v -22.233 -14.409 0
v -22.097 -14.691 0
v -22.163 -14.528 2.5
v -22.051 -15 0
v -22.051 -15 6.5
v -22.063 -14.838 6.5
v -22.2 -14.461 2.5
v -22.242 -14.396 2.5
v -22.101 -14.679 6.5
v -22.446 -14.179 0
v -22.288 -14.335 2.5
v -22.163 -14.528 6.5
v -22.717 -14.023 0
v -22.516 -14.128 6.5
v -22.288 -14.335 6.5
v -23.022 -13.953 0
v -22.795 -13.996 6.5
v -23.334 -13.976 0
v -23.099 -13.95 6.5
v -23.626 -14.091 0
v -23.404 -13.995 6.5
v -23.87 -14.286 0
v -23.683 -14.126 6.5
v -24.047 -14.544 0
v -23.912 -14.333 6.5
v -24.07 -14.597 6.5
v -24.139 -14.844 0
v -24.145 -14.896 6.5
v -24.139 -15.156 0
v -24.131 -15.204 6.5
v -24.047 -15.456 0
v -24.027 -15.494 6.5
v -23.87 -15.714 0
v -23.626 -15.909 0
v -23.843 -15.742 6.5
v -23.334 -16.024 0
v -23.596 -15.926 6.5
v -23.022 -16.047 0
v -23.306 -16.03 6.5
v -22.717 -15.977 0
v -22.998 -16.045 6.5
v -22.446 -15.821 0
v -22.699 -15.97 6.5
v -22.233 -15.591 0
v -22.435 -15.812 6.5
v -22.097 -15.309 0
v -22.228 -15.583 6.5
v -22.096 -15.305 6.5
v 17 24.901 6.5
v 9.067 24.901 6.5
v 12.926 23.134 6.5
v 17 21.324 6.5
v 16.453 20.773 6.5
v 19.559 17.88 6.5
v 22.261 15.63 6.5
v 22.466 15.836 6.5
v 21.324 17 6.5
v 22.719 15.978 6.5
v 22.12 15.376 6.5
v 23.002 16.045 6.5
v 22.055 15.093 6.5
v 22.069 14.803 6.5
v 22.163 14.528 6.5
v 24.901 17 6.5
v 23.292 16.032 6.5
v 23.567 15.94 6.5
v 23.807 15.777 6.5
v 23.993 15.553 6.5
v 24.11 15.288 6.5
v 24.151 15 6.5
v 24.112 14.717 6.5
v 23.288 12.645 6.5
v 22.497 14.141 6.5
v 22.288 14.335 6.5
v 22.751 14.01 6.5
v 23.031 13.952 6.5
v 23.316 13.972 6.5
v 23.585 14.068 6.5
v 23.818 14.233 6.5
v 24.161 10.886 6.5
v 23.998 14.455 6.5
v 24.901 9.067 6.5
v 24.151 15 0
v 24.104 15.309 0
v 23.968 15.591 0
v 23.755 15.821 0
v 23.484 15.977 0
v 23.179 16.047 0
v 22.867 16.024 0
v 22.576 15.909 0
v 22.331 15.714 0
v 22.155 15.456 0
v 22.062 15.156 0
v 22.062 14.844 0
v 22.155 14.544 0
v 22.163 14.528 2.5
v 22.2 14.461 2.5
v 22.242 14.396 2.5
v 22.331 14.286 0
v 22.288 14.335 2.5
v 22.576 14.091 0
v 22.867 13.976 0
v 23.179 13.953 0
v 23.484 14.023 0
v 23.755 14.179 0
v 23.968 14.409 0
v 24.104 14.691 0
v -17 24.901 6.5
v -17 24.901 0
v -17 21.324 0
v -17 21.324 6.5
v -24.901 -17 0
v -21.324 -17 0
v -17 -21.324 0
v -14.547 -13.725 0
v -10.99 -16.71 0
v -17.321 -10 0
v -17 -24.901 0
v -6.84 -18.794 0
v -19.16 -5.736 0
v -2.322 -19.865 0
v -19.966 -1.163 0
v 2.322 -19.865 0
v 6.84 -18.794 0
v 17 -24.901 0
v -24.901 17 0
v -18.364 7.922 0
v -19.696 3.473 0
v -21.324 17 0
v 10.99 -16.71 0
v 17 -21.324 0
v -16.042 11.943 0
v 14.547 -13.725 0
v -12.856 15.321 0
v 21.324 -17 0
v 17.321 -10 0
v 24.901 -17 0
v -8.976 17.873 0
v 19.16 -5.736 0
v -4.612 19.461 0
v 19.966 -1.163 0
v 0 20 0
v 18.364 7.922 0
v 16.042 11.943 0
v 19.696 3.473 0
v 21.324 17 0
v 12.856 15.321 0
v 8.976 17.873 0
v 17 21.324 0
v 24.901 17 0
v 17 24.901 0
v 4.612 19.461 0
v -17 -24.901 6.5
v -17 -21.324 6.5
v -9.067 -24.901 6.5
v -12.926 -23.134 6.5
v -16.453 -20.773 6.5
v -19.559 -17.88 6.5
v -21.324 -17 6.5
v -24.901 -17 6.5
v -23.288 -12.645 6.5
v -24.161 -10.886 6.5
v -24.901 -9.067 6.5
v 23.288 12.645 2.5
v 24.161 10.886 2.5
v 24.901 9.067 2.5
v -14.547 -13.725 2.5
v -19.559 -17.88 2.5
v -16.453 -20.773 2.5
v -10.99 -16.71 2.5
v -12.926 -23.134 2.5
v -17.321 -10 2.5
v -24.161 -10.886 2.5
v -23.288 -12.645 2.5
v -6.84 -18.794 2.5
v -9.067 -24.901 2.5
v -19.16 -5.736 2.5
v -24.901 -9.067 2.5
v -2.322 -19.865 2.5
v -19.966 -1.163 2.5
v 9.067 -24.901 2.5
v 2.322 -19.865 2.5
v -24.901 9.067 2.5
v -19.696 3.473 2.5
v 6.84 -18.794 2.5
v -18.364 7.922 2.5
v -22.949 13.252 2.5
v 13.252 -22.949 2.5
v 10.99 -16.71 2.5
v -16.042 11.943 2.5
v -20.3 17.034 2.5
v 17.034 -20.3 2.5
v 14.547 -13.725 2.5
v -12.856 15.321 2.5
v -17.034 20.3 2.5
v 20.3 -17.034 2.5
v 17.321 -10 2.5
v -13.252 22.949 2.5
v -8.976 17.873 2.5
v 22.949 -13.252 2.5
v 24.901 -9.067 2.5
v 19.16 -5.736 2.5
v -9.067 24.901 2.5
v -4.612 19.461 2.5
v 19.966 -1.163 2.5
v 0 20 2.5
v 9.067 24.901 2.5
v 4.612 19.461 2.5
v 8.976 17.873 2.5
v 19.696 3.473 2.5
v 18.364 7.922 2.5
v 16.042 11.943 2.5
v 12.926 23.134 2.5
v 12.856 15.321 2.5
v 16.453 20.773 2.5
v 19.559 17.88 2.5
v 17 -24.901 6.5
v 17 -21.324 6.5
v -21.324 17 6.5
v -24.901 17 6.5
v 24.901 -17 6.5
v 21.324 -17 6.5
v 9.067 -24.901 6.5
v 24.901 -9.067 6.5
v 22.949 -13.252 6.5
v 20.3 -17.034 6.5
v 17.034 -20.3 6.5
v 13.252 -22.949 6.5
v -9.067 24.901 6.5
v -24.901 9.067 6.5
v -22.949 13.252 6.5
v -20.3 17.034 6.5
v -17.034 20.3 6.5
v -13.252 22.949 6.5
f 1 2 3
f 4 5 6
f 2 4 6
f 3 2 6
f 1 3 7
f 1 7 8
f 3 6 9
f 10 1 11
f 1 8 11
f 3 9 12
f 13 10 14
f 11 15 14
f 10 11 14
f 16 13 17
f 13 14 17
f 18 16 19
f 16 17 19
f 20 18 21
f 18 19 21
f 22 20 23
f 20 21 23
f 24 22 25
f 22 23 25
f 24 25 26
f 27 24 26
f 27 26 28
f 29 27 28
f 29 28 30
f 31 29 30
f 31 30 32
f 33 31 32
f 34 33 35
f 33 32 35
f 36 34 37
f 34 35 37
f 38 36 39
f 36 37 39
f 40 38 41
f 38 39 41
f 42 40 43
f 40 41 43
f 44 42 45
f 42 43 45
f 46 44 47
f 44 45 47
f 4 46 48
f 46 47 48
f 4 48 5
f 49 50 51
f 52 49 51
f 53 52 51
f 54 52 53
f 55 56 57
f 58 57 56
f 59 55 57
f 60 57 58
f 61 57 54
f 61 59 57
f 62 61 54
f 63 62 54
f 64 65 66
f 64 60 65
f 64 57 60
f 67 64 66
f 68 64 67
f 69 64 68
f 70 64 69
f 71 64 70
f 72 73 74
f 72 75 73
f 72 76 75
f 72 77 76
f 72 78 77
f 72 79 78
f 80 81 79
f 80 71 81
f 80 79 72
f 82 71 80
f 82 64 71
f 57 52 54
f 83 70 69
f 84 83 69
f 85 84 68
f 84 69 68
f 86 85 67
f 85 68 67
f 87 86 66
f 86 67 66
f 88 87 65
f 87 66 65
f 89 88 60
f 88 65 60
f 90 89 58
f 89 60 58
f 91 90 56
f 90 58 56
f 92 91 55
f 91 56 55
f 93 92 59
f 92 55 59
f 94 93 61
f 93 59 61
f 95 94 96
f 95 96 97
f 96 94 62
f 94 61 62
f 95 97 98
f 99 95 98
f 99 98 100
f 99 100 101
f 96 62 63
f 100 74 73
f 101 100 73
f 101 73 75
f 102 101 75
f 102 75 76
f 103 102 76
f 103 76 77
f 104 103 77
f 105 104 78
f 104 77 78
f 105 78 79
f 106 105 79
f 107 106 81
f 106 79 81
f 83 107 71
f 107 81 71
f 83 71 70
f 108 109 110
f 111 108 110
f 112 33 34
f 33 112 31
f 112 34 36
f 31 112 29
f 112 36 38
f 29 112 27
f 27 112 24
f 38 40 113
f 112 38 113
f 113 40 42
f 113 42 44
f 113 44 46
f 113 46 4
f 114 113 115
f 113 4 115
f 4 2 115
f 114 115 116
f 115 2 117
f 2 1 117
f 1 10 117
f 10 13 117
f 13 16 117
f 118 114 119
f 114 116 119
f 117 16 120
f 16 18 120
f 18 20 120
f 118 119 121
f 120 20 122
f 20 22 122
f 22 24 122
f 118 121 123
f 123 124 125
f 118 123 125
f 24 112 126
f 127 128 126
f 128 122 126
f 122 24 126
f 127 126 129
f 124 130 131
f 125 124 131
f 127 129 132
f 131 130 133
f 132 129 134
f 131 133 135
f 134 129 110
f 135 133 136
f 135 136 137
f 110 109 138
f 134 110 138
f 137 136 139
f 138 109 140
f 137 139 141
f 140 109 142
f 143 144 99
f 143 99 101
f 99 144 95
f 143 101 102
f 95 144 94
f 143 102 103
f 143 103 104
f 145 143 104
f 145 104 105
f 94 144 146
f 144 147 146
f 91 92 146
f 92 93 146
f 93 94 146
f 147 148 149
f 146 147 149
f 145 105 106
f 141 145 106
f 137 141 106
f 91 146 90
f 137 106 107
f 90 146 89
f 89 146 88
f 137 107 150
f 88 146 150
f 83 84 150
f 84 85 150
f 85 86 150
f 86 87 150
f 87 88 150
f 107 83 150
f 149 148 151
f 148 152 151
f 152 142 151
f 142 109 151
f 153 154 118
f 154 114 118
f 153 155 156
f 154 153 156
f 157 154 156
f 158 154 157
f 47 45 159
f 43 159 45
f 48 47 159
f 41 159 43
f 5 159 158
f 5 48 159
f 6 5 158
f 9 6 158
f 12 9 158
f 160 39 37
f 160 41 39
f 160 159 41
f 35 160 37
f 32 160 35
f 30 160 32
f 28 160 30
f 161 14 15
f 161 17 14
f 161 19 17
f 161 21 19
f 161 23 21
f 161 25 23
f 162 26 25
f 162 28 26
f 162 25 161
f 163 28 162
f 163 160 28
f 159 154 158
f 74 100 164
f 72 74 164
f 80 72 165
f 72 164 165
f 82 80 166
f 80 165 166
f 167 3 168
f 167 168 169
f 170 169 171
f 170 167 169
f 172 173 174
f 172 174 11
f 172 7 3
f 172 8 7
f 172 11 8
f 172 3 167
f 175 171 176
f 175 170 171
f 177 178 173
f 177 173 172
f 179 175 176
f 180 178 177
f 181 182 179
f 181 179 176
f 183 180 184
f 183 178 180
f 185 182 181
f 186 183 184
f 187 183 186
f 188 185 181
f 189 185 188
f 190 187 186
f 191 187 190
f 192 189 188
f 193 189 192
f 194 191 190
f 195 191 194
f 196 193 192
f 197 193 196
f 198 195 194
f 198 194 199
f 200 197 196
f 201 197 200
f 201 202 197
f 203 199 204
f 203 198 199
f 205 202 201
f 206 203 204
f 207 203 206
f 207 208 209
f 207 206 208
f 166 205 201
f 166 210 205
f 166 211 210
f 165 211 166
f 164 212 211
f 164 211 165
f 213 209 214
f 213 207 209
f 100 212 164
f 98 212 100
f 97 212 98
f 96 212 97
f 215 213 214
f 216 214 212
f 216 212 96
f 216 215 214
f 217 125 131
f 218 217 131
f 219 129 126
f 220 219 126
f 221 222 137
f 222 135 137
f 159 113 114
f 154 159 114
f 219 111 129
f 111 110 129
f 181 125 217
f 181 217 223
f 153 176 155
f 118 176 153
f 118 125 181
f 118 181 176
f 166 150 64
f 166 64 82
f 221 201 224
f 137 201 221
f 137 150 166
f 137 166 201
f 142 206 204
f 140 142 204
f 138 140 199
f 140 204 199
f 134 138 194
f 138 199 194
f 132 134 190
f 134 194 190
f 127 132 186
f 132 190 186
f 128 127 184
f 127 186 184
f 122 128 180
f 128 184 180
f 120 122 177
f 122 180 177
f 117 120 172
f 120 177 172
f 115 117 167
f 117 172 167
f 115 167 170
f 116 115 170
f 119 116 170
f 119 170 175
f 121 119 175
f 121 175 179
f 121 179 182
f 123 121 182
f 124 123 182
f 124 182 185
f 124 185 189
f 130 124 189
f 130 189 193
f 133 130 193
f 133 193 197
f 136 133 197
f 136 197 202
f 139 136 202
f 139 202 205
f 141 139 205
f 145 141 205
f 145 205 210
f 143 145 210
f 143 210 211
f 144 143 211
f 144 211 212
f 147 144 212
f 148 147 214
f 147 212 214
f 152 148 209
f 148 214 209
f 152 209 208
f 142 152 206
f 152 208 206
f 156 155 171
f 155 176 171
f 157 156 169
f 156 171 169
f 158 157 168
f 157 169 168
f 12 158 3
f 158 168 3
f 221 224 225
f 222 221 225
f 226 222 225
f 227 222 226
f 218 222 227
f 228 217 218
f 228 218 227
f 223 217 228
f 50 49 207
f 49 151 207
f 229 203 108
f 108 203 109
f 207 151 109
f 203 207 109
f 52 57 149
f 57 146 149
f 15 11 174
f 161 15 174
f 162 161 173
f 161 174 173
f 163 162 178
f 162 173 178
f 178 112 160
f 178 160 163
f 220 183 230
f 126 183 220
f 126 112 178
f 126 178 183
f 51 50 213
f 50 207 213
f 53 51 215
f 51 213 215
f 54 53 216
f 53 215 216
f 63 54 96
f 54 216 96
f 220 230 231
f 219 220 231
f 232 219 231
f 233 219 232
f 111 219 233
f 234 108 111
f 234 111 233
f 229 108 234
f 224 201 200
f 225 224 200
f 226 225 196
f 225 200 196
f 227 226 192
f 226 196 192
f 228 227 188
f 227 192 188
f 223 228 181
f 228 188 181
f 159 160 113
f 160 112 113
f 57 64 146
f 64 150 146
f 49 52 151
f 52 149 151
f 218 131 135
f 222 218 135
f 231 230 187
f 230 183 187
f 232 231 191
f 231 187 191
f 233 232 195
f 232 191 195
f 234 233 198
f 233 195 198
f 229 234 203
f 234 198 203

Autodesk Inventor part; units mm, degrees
ref_plane "YZ Plane" through (0, 0, 0) normal (1, 0, 0) x (0, 1, 0)
ref_plane "XZ Plane" through (0, 0, 0) normal (0, 1, 0) x (-1, 0, 0)
ref_plane "XY Plane" through (0, 0, 0) normal (0, 0, 1) x (1, 0, 0)
sketch "Sketch1" plane through (0, 0, 0) normal (0, 0, 1) x (1, 0, 0)
  line L0 (-34.8609, 0) -> (34.8609, 0) construction
  line L1 (0, -34.8609) -> (0, 34.8609) construction
  line L2 (0, 0) -> (11.6542, 11.6542) construction
  line L3 (0, 0) -> (16.4815, 0) construction
  line L4 (0, 24.9006) -> (16.8, 24.9006)
  line L5 (16.8, 24.9006) -> (16.8, 21.2406)
  line L6 (16.8, 21.2406) -> (19.0203, 19.0203)
  line L7 (24.9006, 0) -> (24.9006, 16.8)
  line L8 (24.9006, 16.8) -> (21.2406, 16.8)
  line L9 (21.2406, 16.8) -> (19.0203, 19.0203)
  line L10 (0, 0) -> (-11.6542, 11.6542) construction
  line L11 (0, 0) -> (-16.4815, 0) construction
  line L12 (0, 24.9006) -> (-16.8, 24.9006)
  line L13 (-16.8, 24.9006) -> (-16.8, 21.2406)
  line L14 (-16.8, 21.2406) -> (-19.0203, 19.0203)
  line L15 (-24.9006, 0) -> (-24.9006, 16.8)
  line L16 (-24.9006, 16.8) -> (-21.2406, 16.8)
  line L17 (-21.2406, 16.8) -> (-19.0203, 19.0203)
  line L18 (0, 0) -> (11.6542, -11.6542) construction
  line L19 (0, -24.9006) -> (16.8, -24.9006)
  line L20 (16.8, -24.9006) -> (16.8, -21.2406)
  line L21 (16.8, -21.2406) -> (19.0203, -19.0203)
  line L22 (24.9006, 0) -> (24.9006, -16.8)
  line L23 (24.9006, -16.8) -> (21.2406, -16.8)
  line L24 (21.2406, -16.8) -> (19.0203, -19.0203)
  line L25 (0, 0) -> (-11.6542, -11.6542) construction
  line L26 (0, -24.9006) -> (-16.8, -24.9006)
  line L27 (-16.8, -24.9006) -> (-16.8, -21.2406)
  line L28 (-16.8, -21.2406) -> (-19.0203, -19.0203)
  line L29 (-24.9006, 0) -> (-24.9006, -16.8)
  line L30 (-24.9006, -16.8) -> (-21.2406, -16.8)
  line L31 (-21.2406, -16.8) -> (-19.0203, -19.0203)
  dimension "d0" = 45
  dimension "d1" = 3.14
  dimension "d2" = 3.66
  dimension "d3" = 16.8
extrude "Extrusion1" add sketch "Sketch1" along normal blind 2.5
hole "Hole1" at (0, 0, 0) direction (0, 0, 1) diameter 40 end through all
sketch "Sketch5" plane through (0, 0, 2.5) normal (0, 0, 1) x (1, 0, 0)
  circle A0 centre (-22.1796, -5.0624) radius 1.25 construction
  circle A1 centre (-17.7867, 14.1844) radius 1.25 construction
  circle A2 centre (0, 22.75) radius 1.25 construction
  arc A3 (5.9445, 23.5204) -> (2.0147, 24.1761) centre (3.9503, 23.6727) ccw construction
  line L0 (2.0147, 24.1761) -> (2, 24) construction
  arc A4 (2, 24) -> (1.9973, 24.1039) centre (0, 24) ccw construction
  arc A5 (1.9973, 24.1039) -> (1.9775, 24.0019) centre (3.9503, 23.6727) ccw construction
  line L1 (1.9775, 24.0019) -> (1.9921, 24.178) construction
  arc A6 (1.9921, 24.178) -> (-1.9921, 24.178) centre (0, 24) ccw construction
  line L2 (-1.9921, 24.178) -> (-1.9775, 24.0019) construction
  arc A7 (-1.9775, 24.0019) -> (-1.9973, 24.1039) centre (-3.9503, 23.6727) ccw construction
  arc A8 (-1.9973, 24.1039) -> (-2, 24) centre (0, 24) ccw construction
  line L3 (-2, 24) -> (-2.0147, 24.1761) construction
  arc A9 (-2.0147, 24.1761) -> (-5.9445, 23.5204) centre (-3.9503, 23.6727) ccw construction
  line L4 (-5.9445, 23.5204) -> (-5.9012, 23.349) construction
  arc A10 (-5.9012, 23.349) -> (-5.9374, 23.4464) centre (-7.7928, 22.6996) ccw construction
  arc A11 (-5.9374, 23.4464) -> (-5.923, 23.3435) centre (-3.9503, 23.6727) ccw construction
  line L5 (-5.923, 23.3435) -> (-5.9665, 23.5148) construction
  arc A12 (-5.9665, 23.5148) -> (-9.7347, 22.2212) centre (-7.7928, 22.6996) ccw construction
  line L6 (-9.7347, 22.2212) -> (-9.6638, 22.0593) construction
  arc A13 (-9.6638, 22.0593) -> (-9.7156, 22.1493) centre (-11.4227, 21.1074) ccw construction
  arc A14 (-9.7156, 22.1493) -> (-9.6844, 22.0502) centre (-7.7928, 22.6996) ccw construction
  line L7 (-9.6844, 22.0502) -> (-9.7555, 22.212) construction
  arc A15 (-9.7555, 22.212) -> (-13.2594, 20.3158) centre (-11.4227, 21.1074) ccw construction
  line L8 (-13.2594, 20.3158) -> (-13.1628, 20.1678) construction
  arc A16 (-13.1628, 20.1678) -> (-13.2287, 20.2481) centre (-14.7411, 18.9394) ccw construction
  arc A17 (-13.2287, 20.2481) -> (-13.1817, 20.1555) centre (-11.4227, 21.1074) ccw construction
  line L9 (-13.1817, 20.1555) -> (-13.2784, 20.3034) construction
  arc A18 (-13.2784, 20.3034) -> (-16.4225, 17.8563) centre (-14.7411, 18.9394) ccw construction
  line L10 (-16.4225, 17.8563) -> (-16.3028, 17.7262) construction
  arc A19 (-16.3028, 17.7262) -> (-16.381, 17.7946) centre (-17.6574, 16.2548) ccw construction
  arc A20 (-16.381, 17.7946) -> (-16.3194, 17.7109) centre (-14.7411, 18.9394) ccw construction
  line L11 (-16.3194, 17.7109) -> (-16.4392, 17.8409) construction
  arc A21 (-16.4392, 17.8409) -> (-19.1375, 14.9097) centre (-17.6574, 16.2548) ccw construction
  line L12 (-19.1375, 14.9097) -> (-18.9981, 14.8011) construction
  arc A22 (-18.9981, 14.8011) -> (-19.0865, 14.8556) centre (-20.092, 13.1268) ccw construction
  arc A23 (-19.0865, 14.8556) -> (-19.0119, 14.7833) centre (-17.6574, 16.2548) ccw construction
  line L13 (-19.0119, 14.7833) -> (-19.1515, 14.8918) construction
  arc A24 (-19.1515, 14.8918) -> (-21.3306, 11.5564) centre (-20.092, 13.1268) ccw construction
  line L14 (-21.3306, 11.5564) -> (-21.1752, 11.4722) construction
  arc A25 (-21.1752, 11.4722) -> (-21.2714, 11.5115) centre (-21.9786, 9.6407) ccw construction
  arc A26 (-21.2714, 11.5115) -> (-21.1859, 11.4524) centre (-20.092, 13.1268) ccw construction
  line L15 (-21.1859, 11.4524) -> (-21.3414, 11.5365) construction
  arc A27 (-21.3414, 11.5365) -> (-22.9418, 7.8879) centre (-21.9786, 9.6407) ccw construction
  line L16 (-22.9418, 7.8879) -> (-22.7746, 7.8305) construction
  arc A28 (-22.7746, 7.8305) -> (-22.876, 7.8533) centre (-23.2656, 5.8917) ccw construction
  arc A29 (-22.876, 7.8533) -> (-22.782, 7.8091) centre (-21.9786, 9.6407) ccw construction
  line L17 (-22.782, 7.8091) -> (-22.9492, 7.8665) construction
  arc A30 (-22.9492, 7.8665) -> (-23.9272, 4.0042) centre (-23.2656, 5.8917) ccw construction
  line L18 (-23.9272, 4.0042) -> (-23.7529, 3.9751) construction
  arc A31 (-23.7529, 3.9751) -> (-23.8566, 3.981) centre (-23.918, 1.9819) ccw construction
  arc A32 (-23.8566, 3.981) -> (-23.7566, 3.9529) centre (-23.2656, 5.8917) ccw construction
  line L19 (-23.7566, 3.9529) -> (-23.9309, 3.9819) construction
  arc A33 (-23.9309, 3.9819) -> (-24.2599, 0.0113) centre (-23.918, 1.9819) ccw construction
  line L20 (-24.2599, 0.0113) -> (-24.0832, 0.0113) construction
  arc A34 (-24.0832, 0.0113) -> (-24.1865, 0) centre (-23.918, -1.9819) ccw construction
  arc A35 (-24.1865, 0) -> (-24.0832, -0.0113) centre (-23.918, 1.9819) ccw construction
  line L21 (-24.0832, -0.0113) -> (-24.2599, -0.0113) construction
  arc A36 (-24.2599, -0.0113) -> (-23.9309, -3.9819) centre (-23.918, -1.9819) ccw construction
  line L22 (-23.9309, -3.9819) -> (-23.7566, -3.9529) construction
  arc A37 (-23.7566, -3.9529) -> (-23.8566, -3.981) centre (-23.2656, -5.8917) ccw construction
  arc A38 (-23.8566, -3.981) -> (-23.7529, -3.9751) centre (-23.918, -1.9819) ccw construction
  line L23 (-23.7529, -3.9751) -> (-23.9272, -4.0042) construction
  arc A39 (-23.9272, -4.0042) -> (-22.9492, -7.8665) centre (-23.2656, -5.8917) ccw construction
  line L24 (-22.9492, -7.8665) -> (-22.782, -7.8091) construction
  arc A40 (-22.782, -7.8091) -> (-22.876, -7.8533) centre (-21.9786, -9.6407) ccw construction
  arc A41 (-22.876, -7.8533) -> (-22.7746, -7.8305) centre (-23.2656, -5.8917) ccw construction
  line L25 (-22.7746, -7.8305) -> (-22.9418, -7.8879) construction
  arc A42 (-22.9418, -7.8879) -> (-21.3414, -11.5365) centre (-21.9786, -9.6407) ccw construction
  line L26 (-21.3414, -11.5365) -> (-21.1859, -11.4524) construction
  arc A43 (-21.1859, -11.4524) -> (-21.2714, -11.5115) centre (-20.092, -13.1268) ccw construction
  arc A44 (-21.2714, -11.5115) -> (-21.1752, -11.4722) centre (-21.9786, -9.6407) ccw construction
  line L27 (-21.1752, -11.4722) -> (-21.3306, -11.5564) construction
  arc A45 (-21.3306, -11.5564) -> (-19.1515, -14.8918) centre (-20.092, -13.1268) ccw construction
  line L28 (-19.1515, -14.8918) -> (-19.0119, -14.7833) construction
  arc A46 (-19.0119, -14.7833) -> (-19.0865, -14.8556) centre (-17.6574, -16.2548) ccw construction
  arc A47 (-19.0865, -14.8556) -> (-18.9981, -14.8011) centre (-20.092, -13.1268) ccw construction
  line L29 (-18.9981, -14.8011) -> (-19.1375, -14.9097) construction
  arc A48 (-19.1375, -14.9097) -> (-16.4392, -17.8409) centre (-17.6574, -16.2548) ccw construction
  line L30 (-16.4392, -17.8409) -> (-16.3194, -17.7109) construction
  arc A49 (-16.3194, -17.7109) -> (-16.381, -17.7946) centre (-14.7411, -18.9394) ccw construction
  arc A50 (-16.381, -17.7946) -> (-16.3028, -17.7262) centre (-17.6574, -16.2548) ccw construction
  line L31 (-16.3028, -17.7262) -> (-16.4225, -17.8563) construction
  arc A51 (-16.4225, -17.8563) -> (-13.2784, -20.3034) centre (-14.7411, -18.9394) ccw construction
  line L32 (-13.2784, -20.3034) -> (-13.1817, -20.1555) construction
  arc A52 (-13.1817, -20.1555) -> (-13.2287, -20.2481) centre (-11.4227, -21.1074) ccw construction
  arc A53 (-13.2287, -20.2481) -> (-13.1628, -20.1678) centre (-14.7411, -18.9394) ccw construction
  line L33 (-13.1628, -20.1678) -> (-13.2594, -20.3158) construction
  arc A54 (-13.2594, -20.3158) -> (-9.7555, -22.212) centre (-11.4227, -21.1074) ccw construction
  line L34 (-9.7555, -22.212) -> (-9.6844, -22.0502) construction
  arc A55 (-9.6844, -22.0502) -> (-9.7156, -22.1493) centre (-7.7928, -22.6996) ccw construction
  arc A56 (-9.7156, -22.1493) -> (-9.6638, -22.0593) centre (-11.4227, -21.1074) ccw construction
  line L35 (-9.6638, -22.0593) -> (-9.7347, -22.2212) construction
  arc A57 (-9.7347, -22.2212) -> (-5.9665, -23.5148) centre (-7.7928, -22.6996) ccw construction
  line L36 (-5.9665, -23.5148) -> (-5.923, -23.3435) construction
  arc A58 (-5.923, -23.3435) -> (-5.9374, -23.4464) centre (-3.9503, -23.6727) ccw construction
  arc A59 (-5.9374, -23.4464) -> (-5.9012, -23.349) centre (-7.7928, -22.6996) ccw construction
  line L37 (-5.9012, -23.349) -> (-5.9445, -23.5204) construction
  arc A60 (-5.9445, -23.5204) -> (-2.0147, -24.1761) centre (-3.9503, -23.6727) ccw construction
  line L38 (-2.0147, -24.1761) -> (-2, -24) construction
  arc A61 (-2, -24) -> (-1.9973, -24.1039) centre (0, -24) ccw construction
  arc A62 (-1.9973, -24.1039) -> (-1.9775, -24.0019) centre (-3.9503, -23.6727) ccw construction
  line L39 (-1.9775, -24.0019) -> (-1.9921, -24.178) construction
  arc A63 (-1.9921, -24.178) -> (1.9921, -24.178) centre (0, -24) ccw construction
  line L40 (1.9921, -24.178) -> (1.9775, -24.0019) construction
  arc A64 (1.9775, -24.0019) -> (1.9973, -24.1039) centre (3.9503, -23.6727) ccw construction
  arc A65 (1.9973, -24.1039) -> (2, -24) centre (0, -24) ccw construction
  line L41 (2, -24) -> (2.0147, -24.1761) construction
  arc A66 (2.0147, -24.1761) -> (5.9445, -23.5204) centre (3.9503, -23.6727) ccw construction
  line L42 (5.9445, -23.5204) -> (5.9012, -23.349) construction
  arc A67 (5.9012, -23.349) -> (5.9374, -23.4464) centre (7.7928, -22.6996) ccw construction
  arc A68 (5.9374, -23.4464) -> (5.923, -23.3435) centre (3.9503, -23.6727) ccw construction
  line L43 (5.923, -23.3435) -> (5.9665, -23.5148) construction
  arc A69 (5.9665, -23.5148) -> (9.7347, -22.2212) centre (7.7928, -22.6996) ccw construction
  line L44 (9.7347, -22.2212) -> (9.6638, -22.0593) construction
  arc A70 (9.6638, -22.0593) -> (9.7156, -22.1493) centre (11.4227, -21.1074) ccw construction
  arc A71 (9.7156, -22.1493) -> (9.6844, -22.0502) centre (7.7928, -22.6996) ccw construction
  line L45 (9.6844, -22.0502) -> (9.7555, -22.212) construction
  arc A72 (9.7555, -22.212) -> (13.2594, -20.3158) centre (11.4227, -21.1074) ccw construction
  line L46 (13.2594, -20.3158) -> (13.1628, -20.1678) construction
  arc A73 (13.1628, -20.1678) -> (13.2287, -20.2481) centre (14.7411, -18.9394) ccw construction
  arc A74 (13.2287, -20.2481) -> (13.1817, -20.1555) centre (11.4227, -21.1074) ccw construction
  line L47 (13.1817, -20.1555) -> (13.2784, -20.3034) construction
  arc A75 (13.2784, -20.3034) -> (16.4225, -17.8563) centre (14.7411, -18.9394) ccw construction
  line L48 (16.4225, -17.8563) -> (16.3028, -17.7262) construction
  arc A76 (16.3028, -17.7262) -> (16.381, -17.7946) centre (17.6574, -16.2548) ccw construction
  arc A77 (16.381, -17.7946) -> (16.3194, -17.7109) centre (14.7411, -18.9394) ccw construction
  line L49 (16.3194, -17.7109) -> (16.4392, -17.8409) construction
  arc A78 (16.4392, -17.8409) -> (19.1375, -14.9097) centre (17.6574, -16.2548) ccw construction
  line L50 (19.1375, -14.9097) -> (18.9981, -14.8011) construction
  arc A79 (18.9981, -14.8011) -> (19.0865, -14.8556) centre (20.092, -13.1268) ccw construction
  arc A80 (19.0865, -14.8556) -> (19.0119, -14.7833) centre (17.6574, -16.2548) ccw construction
  line L51 (19.0119, -14.7833) -> (19.1515, -14.8918) construction
  arc A81 (19.1515, -14.8918) -> (21.3306, -11.5564) centre (20.092, -13.1268) ccw construction
  line L52 (21.3306, -11.5564) -> (21.1752, -11.4722) construction
  arc A82 (21.1752, -11.4722) -> (21.2714, -11.5115) centre (21.9786, -9.6407) ccw construction
  arc A83 (21.2714, -11.5115) -> (21.1859, -11.4524) centre (20.092, -13.1268) ccw construction
  line L53 (21.1859, -11.4524) -> (21.3414, -11.5365) construction
  arc A84 (21.3414, -11.5365) -> (22.9418, -7.8879) centre (21.9786, -9.6407) ccw construction
  line L54 (22.9418, -7.8879) -> (22.7746, -7.8305) construction
  arc A85 (22.7746, -7.8305) -> (22.876, -7.8533) centre (23.2656, -5.8917) ccw construction
  arc A86 (22.876, -7.8533) -> (22.782, -7.8091) centre (21.9786, -9.6407) ccw construction
  line L55 (22.782, -7.8091) -> (22.9492, -7.8665) construction
  arc A87 (22.9492, -7.8665) -> (23.9272, -4.0042) centre (23.2656, -5.8917) ccw construction
  line L56 (23.9272, -4.0042) -> (23.7529, -3.9751) construction
  arc A88 (23.7529, -3.9751) -> (23.8566, -3.981) centre (23.918, -1.9819) ccw construction
  arc A89 (23.8566, -3.981) -> (23.7566, -3.9529) centre (23.2656, -5.8917) ccw construction
  line L57 (23.7566, -3.9529) -> (23.9309, -3.9819) construction
  arc A90 (23.9309, -3.9819) -> (24.2599, -0.0113) centre (23.918, -1.9819) ccw construction
  line L58 (24.2599, -0.0113) -> (24.0832, -0.0113) construction
  arc A91 (24.0832, -0.0113) -> (24.1865, 0) centre (23.918, 1.9819) ccw construction
  arc A92 (24.1865, 0) -> (24.0832, 0.0113) centre (23.918, -1.9819) ccw construction
  line L59 (24.0832, 0.0113) -> (24.2599, 0.0113) construction
  arc A93 (24.2599, 0.0113) -> (23.9309, 3.9819) centre (23.918, 1.9819) ccw construction
  line L60 (23.9309, 3.9819) -> (23.7566, 3.9529) construction
  arc A94 (23.7566, 3.9529) -> (23.8566, 3.981) centre (23.2656, 5.8917) ccw construction
  arc A95 (23.8566, 3.981) -> (23.7529, 3.9751) centre (23.918, 1.9819) ccw construction
  line L61 (23.7529, 3.9751) -> (23.9272, 4.0042) construction
  arc A96 (23.9272, 4.0042) -> (22.9492, 7.8665) centre (23.2656, 5.8917) ccw construction
  line L62 (22.9492, 7.8665) -> (22.782, 7.8091) construction
  arc A97 (22.782, 7.8091) -> (22.876, 7.8533) centre (21.9786, 9.6407) ccw construction
  arc A98 (22.876, 7.8533) -> (22.7746, 7.8305) centre (23.2656, 5.8917) ccw construction
  line L63 (22.7746, 7.8305) -> (22.9418, 7.8879) construction
  arc A99 (22.9418, 7.8879) -> (21.3414, 11.5365) centre (21.9786, 9.6407) ccw construction
  line L64 (21.3414, 11.5365) -> (21.1859, 11.4524) construction
  arc A100 (21.1859, 11.4524) -> (21.2714, 11.5115) centre (20.092, 13.1268) ccw construction
  arc A101 (21.2714, 11.5115) -> (21.1752, 11.4722) centre (21.9786, 9.6407) ccw construction
  line L65 (21.1752, 11.4722) -> (21.3306, 11.5564) construction
  arc A102 (21.3306, 11.5564) -> (19.1515, 14.8918) centre (20.092, 13.1268) ccw construction
  line L66 (19.1515, 14.8918) -> (19.0119, 14.7833) construction
  arc A103 (19.0119, 14.7833) -> (19.0865, 14.8556) centre (17.6574, 16.2548) ccw construction
  arc A104 (19.0865, 14.8556) -> (18.9981, 14.8011) centre (20.092, 13.1268) ccw construction
  line L67 (18.9981, 14.8011) -> (19.1375, 14.9097) construction
  arc A105 (19.1375, 14.9097) -> (16.4392, 17.8409) centre (17.6574, 16.2548) ccw construction
  line L68 (16.4392, 17.8409) -> (16.3194, 17.7109) construction
  arc A106 (16.3194, 17.7109) -> (16.381, 17.7946) centre (14.7411, 18.9394) ccw construction
  arc A107 (16.381, 17.7946) -> (16.3028, 17.7262) centre (17.6574, 16.2548) ccw construction
  line L69 (16.3028, 17.7262) -> (16.4225, 17.8563) construction
  arc A108 (16.4225, 17.8563) -> (13.2784, 20.3034) centre (14.7411, 18.9394) ccw construction
  line L70 (13.2784, 20.3034) -> (13.1817, 20.1555) construction
  arc A109 (13.1817, 20.1555) -> (13.2287, 20.2481) centre (11.4227, 21.1074) ccw construction
  arc A110 (13.2287, 20.2481) -> (13.1628, 20.1678) centre (14.7411, 18.9394) ccw construction
  line L71 (13.1628, 20.1678) -> (13.2594, 20.3158) construction
  arc A111 (13.2594, 20.3158) -> (9.7555, 22.212) centre (11.4227, 21.1074) ccw construction
  line L72 (9.7555, 22.212) -> (9.6844, 22.0502) construction
  arc A112 (9.6844, 22.0502) -> (9.7156, 22.1493) centre (7.7928, 22.6996) ccw construction
  arc A113 (9.7156, 22.1493) -> (9.6638, 22.0593) centre (11.4227, 21.1074) ccw construction
  line L73 (9.6638, 22.0593) -> (9.7347, 22.2212) construction
  arc A114 (9.7347, 22.2212) -> (5.9665, 23.5148) centre (7.7928, 22.6996) ccw construction
  line L74 (5.9665, 23.5148) -> (5.923, 23.3435) construction
  arc A115 (5.923, 23.3435) -> (5.9374, 23.4464) centre (3.9503, 23.6727) ccw construction
  arc A116 (5.9374, 23.4464) -> (5.9012, 23.349) centre (7.7928, 22.6996) ccw construction
  line L75 (5.9012, 23.349) -> (5.9445, 23.5204) construction
  circle A117 centre (0, 0) radius 21 construction
  circle A118 centre (0, 0) radius 20 construction
  line L76 (16.8, 24.9006) -> (-16.8, 24.9006) construction
  line L77 (-16.8, 24.9006) -> (-16.8, 21.2406) construction
  line L78 (-16.8, 21.2406) -> (-21.2406, 16.8) construction
  line L79 (-21.2406, 16.8) -> (-24.9006, 16.8) construction
  line L80 (-24.9006, 16.8) -> (-24.9006, -16.8) construction
  line L81 (-24.9006, -16.8) -> (-21.2406, -16.8) construction
  line L82 (-21.2406, -16.8) -> (-16.8, -21.2406) construction
  line L83 (-16.8, -21.2406) -> (-16.8, -24.9006) construction
  line L84 (-16.8, -24.9006) -> (16.8, -24.9006) construction
  line L85 (16.8, -24.9006) -> (16.8, -21.2406) construction
  line L86 (16.8, -21.2406) -> (21.2406, -16.8) construction
  line L87 (21.2406, -16.8) -> (24.9006, -16.8) construction
  line L88 (24.9006, -16.8) -> (24.9006, 16.8) construction
  line L89 (24.9006, 16.8) -> (21.2406, 16.8) construction
  line L90 (21.2406, 16.8) -> (16.8, 21.2406) construction
  line L91 (16.8, 21.2406) -> (16.8, 24.9006) construction
  circle A119 centre (0, 0) radius 26 construction
  line L92 (-16.8, 24.9006) -> (16.8, 24.9006) projected
  line L93 (-9.0669, 24.9006) -> (-16.8, 24.9006)
  line L94 (-16.8, 24.9006) -> (-16.8, 21.2406)
  line L95 (-16.8, 21.2406) -> (-21.2406, 16.8)
  line L96 (-24.9006, 16.8) -> (-21.2406, 16.8) projected
  line L97 (-21.2406, 16.8) -> (-24.9006, 16.8)
  line L98 (-24.9006, 16.8) -> (-24.9006, 9.0669)
  line L99 (-24.9006, 16.8) -> (-24.9006, -16.8) projected
  arc A120 (-9.0669, 24.9006) -> (-24.9006, 9.0669) centre (0, 0) ccw
  circle A121 centre (17.7867, 14.1844) radius 1.25 projected
  circle A122 centre (22.1796, -5.0624) radius 1.25 projected
  circle A123 centre (9.8709, -20.497) radius 1.25 projected
  circle A124 centre (-9.8709, -20.497) radius 1.25 projected
  dimension "d20" = 0.5
extrude "Extrusion3" add sketch "Sketch5" along normal blind 4 contours L92 A120 L98 L96 L95 L94
pattern_circular "Circular Pattern1" count 4 over 360 about axis through (0, 0, -10) along (0, 0, 1) of "Extrusion3"
sketch "Sketch6" plane through (9.0669, 24.9006, 6.5) normal (0, 0, 1) x (1, 0, 0)
  line L0 (15.8337, -8.1006) -> (12.1737, -8.1006) construction
  line L1 (12.1737, -8.1006) -> (7.7331, -3.66) construction
  line L2 (7.7331, -3.66) -> (7.7331, 0) construction
  line L3 (7.7331, 0) -> (0, 0) construction
  arc A0 (15.8337, -15.8337) -> (0, 0) centre (-9.0669, -24.9006) ccw construction
  line L4 (15.8337, -15.8337) -> (15.8337, -8.1006) construction
  line L5 (-33.9675, -41.7006) -> (-30.3075, -41.7006) construction
  line L6 (-30.3075, -41.7006) -> (-25.8669, -46.1413) construction
  line L7 (-25.8669, -46.1413) -> (-25.8669, -49.8013) construction
  line L8 (-25.8669, -49.8013) -> (-18.1338, -49.8013) construction
  arc A1 (-33.9675, -33.9675) -> (-18.1338, -49.8013) centre (-9.0669, -24.9006) ccw construction
  line L9 (-33.9675, -33.9675) -> (-33.9675, -41.7006) construction
  circle A2 centre (-32.1675, -39.9006) radius 1.05
  circle A3 centre (14.0337, -9.9006) radius 1.05
  line L10 (-33.9675, -41.7006) -> (-32.1675, -41.7006) construction
  line L11 (-32.1675, -41.7006) -> (-32.1675, -39.9006) construction
  line L12 (-32.1675, -39.9006) -> (-33.9675, -39.9006) construction
  line L13 (-33.9675, -39.9006) -> (-33.9675, -41.7006) construction
  line L14 (7.7331, 0) -> (6.2331, 0) construction
  line L15 (7.7331, -1.5) -> (7.7331, 0) construction
  line L16 (12.1737, -8.1006) -> (15.8337, -8.1006) projected
  line L17 (14.0337, -8.1006) -> (14.0337, -9.9006) construction
  line L18 (14.0337, -9.9006) -> (15.8337, -9.9006) construction
  line L19 (15.8337, -8.1006) -> (15.8337, -41.7006) projected
  dimension "d26" = 2.1
  dimension "d27" = 2.1
  dimension "d28" = 1.8
  dimension "d29" = 1.8
  dimension "d34" = 1.8
  dimension "d35" = 1.8
extrude "Extrusion4" cut sketch "Sketch6" against normal through all
sketch "Skizze7" plane through (0, 0, 0) normal (0, 0, -1) x (-1, 0, 0)
  circle A0 centre (23.1006, -15) radius 1.05 construction
  circle A1 centre (-23.1006, 15) radius 1.05 construction
  circle A2 centre (0, 0) radius 20 construction
  line L0 (16.8, 24.9006) -> (-16.8, 24.9006) construction
  line L1 (-16.8, 24.9006) -> (-16.8, 21.2406) projected
  line L2 (-16.8, 21.2406) -> (-21.2406, 16.8) projected
  line L3 (-21.2406, 16.8) -> (-24.9006, 16.8) projected
  line L4 (-24.9006, 16.8) -> (-24.9006, -16.8) construction
  line L5 (-24.9006, -16.8) -> (-21.2406, -16.8) projected
  line L6 (-21.2406, -16.8) -> (-16.8, -21.2406) projected
  line L7 (-16.8, -21.2406) -> (-16.8, -24.9006) projected
  line L8 (-16.8, -24.9006) -> (16.8, -24.9006) construction
  line L9 (16.8, -24.9006) -> (16.8, -21.2406) projected
  line L10 (16.8, -21.2406) -> (21.2406, -16.8) projected
  line L11 (21.2406, -16.8) -> (24.9006, -16.8) projected
  line L12 (24.9006, -16.8) -> (24.9006, 16.8) construction
  line L13 (24.9006, 16.8) -> (21.2406, 16.8) projected
  line L14 (21.2406, 16.8) -> (16.8, 21.2406) projected
  line L15 (16.8, 21.2406) -> (16.8, 24.9006) projected
  line L16 (-17, 25.1006) -> (17, 25.1006) construction
  line L17 (17, 25.1006) -> (17, 21.3235)
  line L18 (17, 21.3235) -> (21.3235, 17)
  line L19 (21.3235, 17) -> (25.1006, 17)
  line L20 (25.1006, 17) -> (25.1006, -17) construction
  line L21 (25.1006, -17) -> (21.3235, -17)
  line L22 (21.3235, -17) -> (17, -21.3235)
  line L23 (17, -21.3235) -> (17, -25.1006)
  line L24 (17, -25.1006) -> (-17, -25.1006) construction
  line L25 (-17, -25.1006) -> (-17, -21.3235)
  line L26 (-17, -21.3235) -> (-21.3235, -17)
  line L27 (-21.3235, -17) -> (-25.1006, -17)
  line L28 (-25.1006, -17) -> (-25.1006, 17) construction
  line L29 (-25.1006, 17) -> (-21.3235, 17)
  line L30 (-21.3235, 17) -> (-17, 21.3235)
  line L31 (-17, 21.3235) -> (-17, 25.1006)
  line L32 (-21.2406, 16.8) -> (-24.9006, 16.8) projected
  line L33 (-24.9006, 16.8) -> (-24.9006, 17)
  line L34 (-16.8, 24.9006) -> (-17, 24.9006)
  line L35 (16.8, 21.2406) -> (16.8, 24.9006) projected
  line L36 (16.8, 24.9006) -> (17, 24.9006)
  line L37 (24.9006, 16.8) -> (24.9006, 17)
  line L38 (24.9006, -16.8) -> (24.9006, 16.8) projected
  line L39 (24.9006, -16.8) -> (24.9006, -17)
  line L40 (16.8, -24.9006) -> (17, -24.9006)
  line L41 (-16.8, -24.9006) -> (16.8, -24.9006) projected
  line L42 (-16.8, -24.9006) -> (-17, -24.9006)
  line L43 (-24.9006, -16.8) -> (-24.9006, -17)
  dimension "d36" = 0.2
extrude "IM_offset" add sketch "Skizze7" against normal up to surface (6.5 mm away)
properties part number "20_Cube_Insert_CirAp_Lid_v3"
